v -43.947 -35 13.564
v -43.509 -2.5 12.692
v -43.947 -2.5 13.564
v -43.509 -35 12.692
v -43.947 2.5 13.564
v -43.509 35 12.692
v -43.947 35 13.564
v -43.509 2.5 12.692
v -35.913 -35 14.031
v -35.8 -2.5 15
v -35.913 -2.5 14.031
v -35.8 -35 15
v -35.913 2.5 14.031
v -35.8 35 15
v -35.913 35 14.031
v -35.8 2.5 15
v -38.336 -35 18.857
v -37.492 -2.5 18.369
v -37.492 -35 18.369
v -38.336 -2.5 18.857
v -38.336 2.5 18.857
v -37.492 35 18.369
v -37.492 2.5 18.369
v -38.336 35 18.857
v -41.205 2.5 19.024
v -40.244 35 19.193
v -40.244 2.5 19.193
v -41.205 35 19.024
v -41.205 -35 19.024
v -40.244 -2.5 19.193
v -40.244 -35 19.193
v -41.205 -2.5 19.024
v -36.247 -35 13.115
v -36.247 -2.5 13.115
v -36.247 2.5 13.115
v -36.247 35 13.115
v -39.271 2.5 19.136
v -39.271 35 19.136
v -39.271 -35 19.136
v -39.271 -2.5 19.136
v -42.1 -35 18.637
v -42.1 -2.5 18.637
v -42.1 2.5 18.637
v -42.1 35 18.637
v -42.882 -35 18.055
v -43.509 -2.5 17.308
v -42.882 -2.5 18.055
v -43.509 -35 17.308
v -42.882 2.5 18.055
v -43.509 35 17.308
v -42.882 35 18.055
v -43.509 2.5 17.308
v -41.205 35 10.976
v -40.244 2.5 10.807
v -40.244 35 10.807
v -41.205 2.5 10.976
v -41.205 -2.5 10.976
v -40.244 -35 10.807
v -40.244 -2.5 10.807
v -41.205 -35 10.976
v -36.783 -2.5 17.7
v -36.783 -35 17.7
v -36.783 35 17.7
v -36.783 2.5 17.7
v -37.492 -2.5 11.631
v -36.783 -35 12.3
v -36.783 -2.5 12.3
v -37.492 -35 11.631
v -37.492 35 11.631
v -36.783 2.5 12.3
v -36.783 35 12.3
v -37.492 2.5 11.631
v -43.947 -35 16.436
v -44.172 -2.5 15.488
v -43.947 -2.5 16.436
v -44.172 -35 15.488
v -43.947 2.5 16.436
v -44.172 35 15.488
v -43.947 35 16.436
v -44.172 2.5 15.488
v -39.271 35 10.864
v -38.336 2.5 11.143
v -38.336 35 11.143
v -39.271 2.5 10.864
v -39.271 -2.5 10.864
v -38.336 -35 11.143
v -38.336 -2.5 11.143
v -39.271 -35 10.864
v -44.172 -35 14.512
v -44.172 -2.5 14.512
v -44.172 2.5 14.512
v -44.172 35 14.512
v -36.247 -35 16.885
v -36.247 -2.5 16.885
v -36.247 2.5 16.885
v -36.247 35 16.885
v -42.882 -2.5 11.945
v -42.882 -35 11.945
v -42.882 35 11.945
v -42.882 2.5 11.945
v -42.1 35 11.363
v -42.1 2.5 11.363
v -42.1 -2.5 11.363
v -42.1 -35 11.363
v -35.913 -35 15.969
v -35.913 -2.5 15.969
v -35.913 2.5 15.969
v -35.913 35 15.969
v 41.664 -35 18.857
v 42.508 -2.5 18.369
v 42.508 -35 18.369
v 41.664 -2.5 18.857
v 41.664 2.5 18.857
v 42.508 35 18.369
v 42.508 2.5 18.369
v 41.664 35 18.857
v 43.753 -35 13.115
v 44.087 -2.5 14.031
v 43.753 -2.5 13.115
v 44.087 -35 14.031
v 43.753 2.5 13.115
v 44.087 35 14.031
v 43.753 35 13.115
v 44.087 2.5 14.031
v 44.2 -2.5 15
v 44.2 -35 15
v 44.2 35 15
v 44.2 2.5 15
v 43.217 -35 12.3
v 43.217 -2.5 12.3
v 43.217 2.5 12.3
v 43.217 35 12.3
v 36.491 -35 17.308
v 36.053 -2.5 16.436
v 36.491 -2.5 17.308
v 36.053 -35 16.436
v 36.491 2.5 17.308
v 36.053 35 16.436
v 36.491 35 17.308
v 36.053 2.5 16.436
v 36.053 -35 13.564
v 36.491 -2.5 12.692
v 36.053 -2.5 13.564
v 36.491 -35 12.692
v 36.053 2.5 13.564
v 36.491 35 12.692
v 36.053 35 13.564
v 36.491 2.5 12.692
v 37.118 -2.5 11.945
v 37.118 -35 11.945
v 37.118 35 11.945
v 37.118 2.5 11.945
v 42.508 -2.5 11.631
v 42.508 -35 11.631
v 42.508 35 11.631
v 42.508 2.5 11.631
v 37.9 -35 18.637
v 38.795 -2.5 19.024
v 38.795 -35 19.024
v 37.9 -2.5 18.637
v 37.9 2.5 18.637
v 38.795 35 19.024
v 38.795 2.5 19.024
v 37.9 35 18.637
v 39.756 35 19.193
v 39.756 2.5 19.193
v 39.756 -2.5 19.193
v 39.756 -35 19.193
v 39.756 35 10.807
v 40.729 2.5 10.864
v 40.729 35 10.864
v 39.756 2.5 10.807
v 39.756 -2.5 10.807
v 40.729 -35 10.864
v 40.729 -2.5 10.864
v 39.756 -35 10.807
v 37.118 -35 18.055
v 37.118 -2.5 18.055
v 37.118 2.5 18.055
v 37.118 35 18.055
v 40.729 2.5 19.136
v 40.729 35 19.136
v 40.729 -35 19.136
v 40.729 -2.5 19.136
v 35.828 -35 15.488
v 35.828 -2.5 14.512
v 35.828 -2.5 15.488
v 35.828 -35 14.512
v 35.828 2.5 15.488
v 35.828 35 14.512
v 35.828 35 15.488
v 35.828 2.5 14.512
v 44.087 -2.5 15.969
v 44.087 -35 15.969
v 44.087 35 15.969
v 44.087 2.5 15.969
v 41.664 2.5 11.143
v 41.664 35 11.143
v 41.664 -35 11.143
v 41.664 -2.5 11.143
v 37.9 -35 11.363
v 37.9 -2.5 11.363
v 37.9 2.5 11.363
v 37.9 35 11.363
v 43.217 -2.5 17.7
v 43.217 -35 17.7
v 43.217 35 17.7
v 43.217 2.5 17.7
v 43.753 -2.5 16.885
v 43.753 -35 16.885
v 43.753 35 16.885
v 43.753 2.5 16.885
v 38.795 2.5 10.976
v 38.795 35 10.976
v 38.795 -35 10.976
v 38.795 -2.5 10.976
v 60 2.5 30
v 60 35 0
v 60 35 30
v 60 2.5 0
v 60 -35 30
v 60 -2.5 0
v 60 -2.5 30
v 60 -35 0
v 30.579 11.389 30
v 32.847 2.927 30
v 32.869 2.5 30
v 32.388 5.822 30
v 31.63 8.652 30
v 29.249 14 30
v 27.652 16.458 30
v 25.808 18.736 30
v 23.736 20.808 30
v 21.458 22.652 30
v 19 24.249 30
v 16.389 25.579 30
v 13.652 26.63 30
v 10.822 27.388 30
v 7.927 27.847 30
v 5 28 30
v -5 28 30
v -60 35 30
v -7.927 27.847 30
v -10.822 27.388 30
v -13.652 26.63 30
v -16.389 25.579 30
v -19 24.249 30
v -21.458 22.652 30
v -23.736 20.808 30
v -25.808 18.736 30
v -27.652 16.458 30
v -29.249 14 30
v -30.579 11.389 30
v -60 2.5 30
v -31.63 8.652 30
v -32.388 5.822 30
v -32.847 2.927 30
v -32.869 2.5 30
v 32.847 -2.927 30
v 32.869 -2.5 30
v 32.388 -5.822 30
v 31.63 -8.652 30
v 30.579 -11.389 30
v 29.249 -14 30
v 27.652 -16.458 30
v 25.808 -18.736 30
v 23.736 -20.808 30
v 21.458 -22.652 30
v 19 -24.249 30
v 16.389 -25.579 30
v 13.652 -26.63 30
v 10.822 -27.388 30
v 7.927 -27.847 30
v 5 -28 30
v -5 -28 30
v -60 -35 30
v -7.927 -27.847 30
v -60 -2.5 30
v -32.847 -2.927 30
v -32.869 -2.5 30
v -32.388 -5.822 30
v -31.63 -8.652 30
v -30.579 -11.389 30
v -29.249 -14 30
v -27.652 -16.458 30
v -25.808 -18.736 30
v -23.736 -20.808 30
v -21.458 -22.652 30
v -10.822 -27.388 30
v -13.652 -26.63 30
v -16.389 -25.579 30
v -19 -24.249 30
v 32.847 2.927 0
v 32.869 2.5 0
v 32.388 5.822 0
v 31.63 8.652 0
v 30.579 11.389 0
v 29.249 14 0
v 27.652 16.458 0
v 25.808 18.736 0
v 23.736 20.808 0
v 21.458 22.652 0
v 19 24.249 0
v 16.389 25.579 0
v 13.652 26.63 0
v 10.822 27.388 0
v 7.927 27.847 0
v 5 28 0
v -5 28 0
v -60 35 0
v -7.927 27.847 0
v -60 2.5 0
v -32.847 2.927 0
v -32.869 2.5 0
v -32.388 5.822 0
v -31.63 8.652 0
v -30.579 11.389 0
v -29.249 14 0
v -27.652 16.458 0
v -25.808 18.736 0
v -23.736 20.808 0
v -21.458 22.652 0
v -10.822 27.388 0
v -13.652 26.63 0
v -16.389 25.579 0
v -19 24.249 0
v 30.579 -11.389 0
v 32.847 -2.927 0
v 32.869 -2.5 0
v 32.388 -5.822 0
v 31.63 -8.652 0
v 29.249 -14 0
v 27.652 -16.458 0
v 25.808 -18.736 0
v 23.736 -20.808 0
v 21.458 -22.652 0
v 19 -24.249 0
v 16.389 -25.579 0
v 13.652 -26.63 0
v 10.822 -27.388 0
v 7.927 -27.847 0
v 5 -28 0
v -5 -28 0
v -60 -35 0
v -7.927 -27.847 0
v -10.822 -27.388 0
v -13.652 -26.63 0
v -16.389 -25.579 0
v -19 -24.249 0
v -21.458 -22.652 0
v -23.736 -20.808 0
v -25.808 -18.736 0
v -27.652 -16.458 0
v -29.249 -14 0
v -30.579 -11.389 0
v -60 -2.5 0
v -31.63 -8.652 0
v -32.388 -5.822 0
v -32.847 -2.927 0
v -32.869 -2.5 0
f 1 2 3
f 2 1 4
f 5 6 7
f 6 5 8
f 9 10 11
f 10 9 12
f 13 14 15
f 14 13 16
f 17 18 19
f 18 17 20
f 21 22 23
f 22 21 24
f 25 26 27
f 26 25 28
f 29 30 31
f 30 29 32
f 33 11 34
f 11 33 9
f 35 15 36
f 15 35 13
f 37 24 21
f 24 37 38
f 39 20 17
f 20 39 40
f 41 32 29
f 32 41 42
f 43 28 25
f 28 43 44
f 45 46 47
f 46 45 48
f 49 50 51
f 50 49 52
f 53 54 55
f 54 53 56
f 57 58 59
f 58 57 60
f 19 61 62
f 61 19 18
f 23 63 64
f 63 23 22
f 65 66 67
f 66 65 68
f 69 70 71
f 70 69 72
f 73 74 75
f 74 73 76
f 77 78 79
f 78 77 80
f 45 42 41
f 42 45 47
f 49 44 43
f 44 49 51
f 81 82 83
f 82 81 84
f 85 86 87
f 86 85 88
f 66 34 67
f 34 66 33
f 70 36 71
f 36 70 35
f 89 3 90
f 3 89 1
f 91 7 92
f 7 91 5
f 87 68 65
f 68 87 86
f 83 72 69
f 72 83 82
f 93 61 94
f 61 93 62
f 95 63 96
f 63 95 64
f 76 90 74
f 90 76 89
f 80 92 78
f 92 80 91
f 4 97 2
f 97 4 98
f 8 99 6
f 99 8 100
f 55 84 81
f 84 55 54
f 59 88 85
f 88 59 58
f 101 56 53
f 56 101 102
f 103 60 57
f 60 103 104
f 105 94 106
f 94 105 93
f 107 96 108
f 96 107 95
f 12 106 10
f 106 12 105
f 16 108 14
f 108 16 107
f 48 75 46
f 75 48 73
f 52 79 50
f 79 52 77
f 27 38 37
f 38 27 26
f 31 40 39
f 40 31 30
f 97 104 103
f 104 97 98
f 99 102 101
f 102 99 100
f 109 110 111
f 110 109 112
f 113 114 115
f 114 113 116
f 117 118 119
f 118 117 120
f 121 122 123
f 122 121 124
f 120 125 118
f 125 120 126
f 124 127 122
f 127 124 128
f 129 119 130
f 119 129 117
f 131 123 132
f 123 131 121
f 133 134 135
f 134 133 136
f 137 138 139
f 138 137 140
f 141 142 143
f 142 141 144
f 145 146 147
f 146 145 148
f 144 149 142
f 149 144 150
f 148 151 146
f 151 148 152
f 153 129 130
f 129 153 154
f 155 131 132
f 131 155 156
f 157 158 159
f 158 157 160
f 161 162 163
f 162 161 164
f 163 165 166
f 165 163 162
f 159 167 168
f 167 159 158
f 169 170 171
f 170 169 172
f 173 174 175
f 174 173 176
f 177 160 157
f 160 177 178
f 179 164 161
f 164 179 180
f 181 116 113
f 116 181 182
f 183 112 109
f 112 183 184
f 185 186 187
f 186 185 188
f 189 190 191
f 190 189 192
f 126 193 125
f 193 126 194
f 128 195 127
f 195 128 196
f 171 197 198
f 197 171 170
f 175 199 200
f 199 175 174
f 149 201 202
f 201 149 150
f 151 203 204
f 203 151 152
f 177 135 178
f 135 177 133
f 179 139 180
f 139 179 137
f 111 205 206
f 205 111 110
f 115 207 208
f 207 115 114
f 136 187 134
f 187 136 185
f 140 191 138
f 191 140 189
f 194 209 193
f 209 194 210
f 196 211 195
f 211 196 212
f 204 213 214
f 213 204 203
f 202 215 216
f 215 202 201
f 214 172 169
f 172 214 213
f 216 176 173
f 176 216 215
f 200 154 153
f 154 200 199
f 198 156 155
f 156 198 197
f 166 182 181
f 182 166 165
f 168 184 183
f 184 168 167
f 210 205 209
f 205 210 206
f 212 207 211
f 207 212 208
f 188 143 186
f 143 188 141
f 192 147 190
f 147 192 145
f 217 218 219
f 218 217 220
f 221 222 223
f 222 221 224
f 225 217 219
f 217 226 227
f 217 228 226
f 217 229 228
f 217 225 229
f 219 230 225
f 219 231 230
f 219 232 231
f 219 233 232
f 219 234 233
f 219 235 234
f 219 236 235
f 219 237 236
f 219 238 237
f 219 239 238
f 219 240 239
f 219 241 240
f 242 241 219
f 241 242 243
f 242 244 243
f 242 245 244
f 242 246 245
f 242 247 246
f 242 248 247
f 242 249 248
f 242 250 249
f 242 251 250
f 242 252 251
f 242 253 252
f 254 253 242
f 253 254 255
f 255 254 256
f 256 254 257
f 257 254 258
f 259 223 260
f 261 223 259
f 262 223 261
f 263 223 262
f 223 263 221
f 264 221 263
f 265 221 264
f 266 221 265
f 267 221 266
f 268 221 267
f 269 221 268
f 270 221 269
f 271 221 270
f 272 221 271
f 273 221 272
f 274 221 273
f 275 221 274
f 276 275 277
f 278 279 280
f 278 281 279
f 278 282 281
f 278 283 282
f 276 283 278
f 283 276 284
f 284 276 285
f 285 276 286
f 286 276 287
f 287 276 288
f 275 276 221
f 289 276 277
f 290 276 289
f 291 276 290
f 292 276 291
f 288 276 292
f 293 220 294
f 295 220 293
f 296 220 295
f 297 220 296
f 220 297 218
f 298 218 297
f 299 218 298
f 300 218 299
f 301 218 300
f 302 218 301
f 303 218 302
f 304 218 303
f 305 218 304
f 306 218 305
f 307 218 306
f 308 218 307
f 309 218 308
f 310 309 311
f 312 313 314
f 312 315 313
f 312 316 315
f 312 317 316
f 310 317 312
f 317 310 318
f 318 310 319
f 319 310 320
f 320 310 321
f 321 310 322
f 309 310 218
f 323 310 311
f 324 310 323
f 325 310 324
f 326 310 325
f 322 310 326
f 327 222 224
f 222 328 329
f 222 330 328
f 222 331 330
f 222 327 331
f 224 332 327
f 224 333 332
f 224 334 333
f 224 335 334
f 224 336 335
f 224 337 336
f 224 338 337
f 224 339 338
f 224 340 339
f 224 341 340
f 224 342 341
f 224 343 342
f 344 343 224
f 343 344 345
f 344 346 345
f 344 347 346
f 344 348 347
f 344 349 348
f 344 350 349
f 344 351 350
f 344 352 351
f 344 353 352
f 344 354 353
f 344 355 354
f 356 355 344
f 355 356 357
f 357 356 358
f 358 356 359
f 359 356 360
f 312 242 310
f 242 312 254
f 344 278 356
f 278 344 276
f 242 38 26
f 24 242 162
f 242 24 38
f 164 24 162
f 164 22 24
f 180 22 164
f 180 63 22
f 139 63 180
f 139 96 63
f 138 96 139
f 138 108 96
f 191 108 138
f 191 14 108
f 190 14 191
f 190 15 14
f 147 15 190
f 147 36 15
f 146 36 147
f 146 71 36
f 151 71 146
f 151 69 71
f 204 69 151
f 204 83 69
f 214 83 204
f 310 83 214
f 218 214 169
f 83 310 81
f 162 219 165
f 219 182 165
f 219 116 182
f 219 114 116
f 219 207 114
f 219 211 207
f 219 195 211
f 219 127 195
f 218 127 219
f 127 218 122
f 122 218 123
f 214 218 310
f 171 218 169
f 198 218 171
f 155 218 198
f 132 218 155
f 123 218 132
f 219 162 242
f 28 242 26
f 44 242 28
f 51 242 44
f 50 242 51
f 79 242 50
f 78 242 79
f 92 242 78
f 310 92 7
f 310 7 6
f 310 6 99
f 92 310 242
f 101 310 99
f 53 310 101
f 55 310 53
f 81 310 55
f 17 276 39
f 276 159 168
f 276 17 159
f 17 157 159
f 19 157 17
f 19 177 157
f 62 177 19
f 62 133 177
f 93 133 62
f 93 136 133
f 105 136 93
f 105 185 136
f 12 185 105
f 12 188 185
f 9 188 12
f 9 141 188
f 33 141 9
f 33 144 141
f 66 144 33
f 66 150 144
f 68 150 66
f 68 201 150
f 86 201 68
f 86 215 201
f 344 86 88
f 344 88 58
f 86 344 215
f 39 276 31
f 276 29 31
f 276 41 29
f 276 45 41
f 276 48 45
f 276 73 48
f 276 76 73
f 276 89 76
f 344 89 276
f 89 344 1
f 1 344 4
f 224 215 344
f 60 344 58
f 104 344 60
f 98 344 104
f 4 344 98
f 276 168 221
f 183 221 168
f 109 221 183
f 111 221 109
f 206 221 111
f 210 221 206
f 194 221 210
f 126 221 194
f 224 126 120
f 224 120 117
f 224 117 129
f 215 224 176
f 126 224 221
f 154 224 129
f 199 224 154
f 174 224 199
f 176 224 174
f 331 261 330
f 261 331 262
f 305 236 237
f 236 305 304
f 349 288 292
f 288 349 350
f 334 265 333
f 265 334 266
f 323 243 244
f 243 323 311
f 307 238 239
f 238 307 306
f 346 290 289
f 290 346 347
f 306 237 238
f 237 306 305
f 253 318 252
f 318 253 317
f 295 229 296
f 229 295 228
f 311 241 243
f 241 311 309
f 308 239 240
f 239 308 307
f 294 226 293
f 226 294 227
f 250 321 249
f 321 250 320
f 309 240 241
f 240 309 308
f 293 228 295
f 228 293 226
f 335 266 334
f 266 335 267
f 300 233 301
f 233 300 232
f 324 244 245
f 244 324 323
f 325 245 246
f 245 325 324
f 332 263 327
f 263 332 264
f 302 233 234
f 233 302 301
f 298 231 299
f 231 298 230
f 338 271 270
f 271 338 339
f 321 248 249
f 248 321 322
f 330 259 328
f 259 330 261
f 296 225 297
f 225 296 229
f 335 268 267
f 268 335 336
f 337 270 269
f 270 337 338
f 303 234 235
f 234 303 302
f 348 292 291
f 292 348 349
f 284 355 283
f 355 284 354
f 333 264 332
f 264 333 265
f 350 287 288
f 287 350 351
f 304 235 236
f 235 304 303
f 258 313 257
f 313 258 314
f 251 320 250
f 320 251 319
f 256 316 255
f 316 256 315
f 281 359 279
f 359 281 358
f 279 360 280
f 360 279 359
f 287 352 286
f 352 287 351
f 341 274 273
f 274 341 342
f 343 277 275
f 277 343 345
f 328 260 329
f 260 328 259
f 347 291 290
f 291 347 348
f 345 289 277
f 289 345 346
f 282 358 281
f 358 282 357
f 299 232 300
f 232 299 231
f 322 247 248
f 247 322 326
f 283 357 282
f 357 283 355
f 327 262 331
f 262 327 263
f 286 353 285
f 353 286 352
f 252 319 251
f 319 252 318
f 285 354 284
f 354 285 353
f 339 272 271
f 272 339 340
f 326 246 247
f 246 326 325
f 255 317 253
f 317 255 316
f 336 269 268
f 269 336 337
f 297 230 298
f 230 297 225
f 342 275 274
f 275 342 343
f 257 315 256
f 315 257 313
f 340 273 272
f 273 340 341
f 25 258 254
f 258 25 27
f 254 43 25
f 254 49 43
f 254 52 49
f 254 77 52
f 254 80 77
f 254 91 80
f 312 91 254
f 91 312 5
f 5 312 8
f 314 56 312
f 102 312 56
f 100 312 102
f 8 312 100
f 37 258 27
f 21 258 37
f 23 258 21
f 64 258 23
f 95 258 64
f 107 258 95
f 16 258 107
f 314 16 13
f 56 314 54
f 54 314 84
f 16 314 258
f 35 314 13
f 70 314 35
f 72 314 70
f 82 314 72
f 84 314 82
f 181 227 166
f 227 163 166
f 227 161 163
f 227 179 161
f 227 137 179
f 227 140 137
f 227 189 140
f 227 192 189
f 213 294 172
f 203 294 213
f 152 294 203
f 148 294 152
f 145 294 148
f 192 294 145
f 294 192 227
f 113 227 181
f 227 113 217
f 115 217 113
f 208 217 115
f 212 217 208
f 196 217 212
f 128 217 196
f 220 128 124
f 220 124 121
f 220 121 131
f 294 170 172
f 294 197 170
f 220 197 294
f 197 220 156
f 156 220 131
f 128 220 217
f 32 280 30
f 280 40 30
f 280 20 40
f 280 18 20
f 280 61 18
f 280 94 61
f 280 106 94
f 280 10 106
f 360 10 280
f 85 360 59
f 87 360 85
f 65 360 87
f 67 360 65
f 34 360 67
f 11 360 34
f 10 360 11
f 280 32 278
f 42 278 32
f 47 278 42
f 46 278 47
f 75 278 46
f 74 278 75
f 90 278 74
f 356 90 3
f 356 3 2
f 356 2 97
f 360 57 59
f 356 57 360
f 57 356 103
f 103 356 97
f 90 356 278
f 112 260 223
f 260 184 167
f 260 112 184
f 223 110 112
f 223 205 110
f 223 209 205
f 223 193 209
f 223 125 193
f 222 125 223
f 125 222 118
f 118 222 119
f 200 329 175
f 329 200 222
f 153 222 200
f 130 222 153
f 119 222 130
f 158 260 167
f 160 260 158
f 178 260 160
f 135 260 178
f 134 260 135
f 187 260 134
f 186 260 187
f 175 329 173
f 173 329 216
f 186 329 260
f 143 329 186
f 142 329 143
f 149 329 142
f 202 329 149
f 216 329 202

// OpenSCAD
use <../config.scad>
use <../libs/gears.scad>

$fs=$fs/2;
$fa=$fa/2;

n=3;
d = 150;
d2 =152;


e = 3;



//modul = 2; tooth_number1 = 20; tooth_number2 = 92;
//modul = 2.5; tooth_number1 = 20; tooth_number2 = 72;
modul = 3; tooth_number1 = 24; tooth_number2 = 60; //old 60


pressure_angle = 20;
helix_angle = 0;

//5120
lg_int = 47;
lg_int2 = 13;
h_int = 5;
a = 30;
colonne_d=56;
d_case = 145;

//same
//0 same
//1 5120
//2 mk3
tracteur = 2;




l = lg_int+10;
h2=h_int+5;

r_vis = 4.2;

module m8(l, r){
    cylinder(r=r_vis, l);
}

module couronne1(d_int, ang, h_int){
    lg_int = 25;
    
    l = lg_int+30;
    h2=10;
    
    d2=140;
    d3 = 140;

    difference(){
        
        union(){
            spur_gear (modul=modul, tooth_number=tooth_number2, width=10, bore=d_int, pressure_angle=pressure_angle, helix_angle=-helix_angle, optimized=true);
            
            for(i=[0:n]){
                rotate([0,0,i*360/n])hull(){
                    translate([-l/2,d2/2,0]) cylinder(r=9,h2);
                    translate([ l/2,d2/2,0]) cylinder(r=9,h2);
                }
            }
            
            rotate([0,0,0.5*360])hull(){
                translate([-10,d3/2,0]) cylinder(r=9,h2);
                translate([ 10,d3/2,0]) cylinder(r=9,h2);
            }
            
        }
        
        
        for(i=[0:n]){
            rotate([0,0,i*360/n]) translate([0,d_int/2,h2-h_int]) rotate([ang,0,0]) translate([-lg_int/2,-10,]) cube([lg_int, 100, 20]);
            
        
            for(j=[-1,1]){
                rotate([0,0,i*360/n])translate([j*l/2,d2/2,-1]) m8(200);
            }
            
            rotate([0,0,0.5*360])translate([-25,d3/2,-1])m8(200);;
            rotate([0,0,0.5*360])translate([-10,d3/2,-1])m8(200);;
            rotate([0,0,0.5*360])translate([ 10,d3/2,-1]) m8(200);;
            rotate([0,0,0.5*360])translate([25,d3/2,-1])m8(200);;
            
        }

        translate([0,-200,-1]) cube([0.5,200,100]);
        
        
    }
}

/**
 * IH
 **/

module couronne_ih(){
    difference(){
        
        union(){
            spur_gear (modul=modul, tooth_number=tooth_number2, width=10, bore=d_case, pressure_angle=pressure_angle, helix_angle=helix_angle, optimized=true);
            
            
            for(i=[0:n]){
                rotate([0,0,i*360/n])hull(){
                    translate([-l/2,d2/2,0]) cylinder(r=5,1);
                    translate([ l/2,d2/2,0]) cylinder(r=5,1);
                    translate([-l/2,d2/2,-1]) rotate([a,0,0]) translate([0,0,h2]) cylinder(r=6,1);
                    translate([ l/2,d2/2,-1]) rotate([a,0,0]) translate([0,0,h2]) cylinder(r=6,1);
                }
            }
            
        }
        
        
        for(i=[0:n]){
            for(j= [0,1]){
                rotate([0,0,i*360/n])translate([0,d2/2,-1]) rotate([a,0,0]) mirror([j,0,0])translate([-lg_int/2,-10,h2+1.1-h_int]) cube([lg_int2, 20, h_int]);
            }
            
            rotate([0,0,i*360/n])hull(){
                translate([-l/2,d2/2,-1]) rotate([a,0,0]) translate([0,0,h2+1]) cylinder(r=7,10);
                translate([ l/2,d2/2,-1]) rotate([a,0,0]) translate([0,0,h2+1]) cylinder(r=7,10);
            }
        
            for(j=[-1,1]){
                rotate([0,0,i*360/n])translate([j*l/2,d2/2,-1]) rotate([a,0,0]) m3(200);
                rotate([0,0,i*360/n])translate([j*l/2,d2/2,-1]) rotate([a,0,0]) m3_nut2(8);
            }
        }
        
        for(i=[120,240]){
            rotate([0,0,i])translate([0,d2/2,-1]) rotate([a,0,0]) m3(200);
            rotate([0,0,i])translate([0,d2/2,-1]) rotate([a,0,0]) m3_nut2(8);
        } 
        
        translate([0,0,-1]) cube([0.5,200,100]);
        for(i=[-5,5]){
            translate([i,d2/2,-1]) rotate([a,0,0]) m3(200);
            translate([i,d2/2,-1]) rotate([a,0,0]) m3_nut2(8);
        } 
        
    }
}

e_support = 5;
module support_couronne_ih(){
    difference(){
        union(){
            hull(){
                translate([-l/2,0,0]) cylinder(r=6,e_support);
                translate([ l/2,0,0]) cylinder(r=6,e_support);
            }
        }
        translate([-l/2,0,-1])  m4(200);
        translate([ 0,0,-1])  m4(200);
        translate([ l/2,0,-1])  m4(200);
    }
}

module support_couronne_ih2(){
    difference(){
        union(){
            hull(){
                translate([-l/2,0,0]) cylinder(r=6,e_support);
                translate([ l/2,0,0]) cylinder(r=6,e_support);
            }
        }
        translate([-l/2,0,-1])  m4(200);
        translate([ 5,0,-1])  m4(200);
        translate([ -5,0,-1])  m4(200);
        translate([ l/2,0,-1])  m4(200);
    }
}

x_vis_ih = 80;

module support_colonne_ih(){
    e = 40;
    r  = colonne_d/2+8;
    l = 120;
    lg= 60;
    
    difference(){
        union(){
            cylinder(r=r, e);
            translate([-l/2, -15, 0])cube([l, lg, e]);
        }
        translate([0, 0, -1]) cylinder(r=colonne_d/2, e+2);
        cube([150, 5, 150], center = true);
        
        for(i=[-1,1]){
            translate([i*x_vis_ih/2, -20, e/2]) rotate([-90,0,0]) m8(100, false);
        }
        
    }
    
}

module support_colonne2_ih(){
    
    difference(){
        union(){
            translate([-60,0,0]) cube([120,30,30]);
            for(i=[0,1]){
                mirror([i,0,0])translate([-60,30,0]) cube([30,30,30]);
            }
        }   
        translate([x_vis_ih/2,100,15])  rotate([90,0,0]) m8(200, false);
        translate([-x_vis_ih/2,100,15]) rotate([90,0,0]) m8(200, false);
        
        translate([x_vis_2/2,45,-1])   m8(200, false);
        translate([-x_vis_2/2,45,-1])  m8(200, false);
    }
}


/**
 * SAME
 **/

lg_same_int = 25;
h_same_int = 30;
l_same = lg_same_int+30;
d_same = 120;
same_ang = 25;

module couronne_same(){
    couronne1(d_same, 25, 8);
}

module support_couronne_same(){
    difference(){
        union(){
            translate([-l_same/2-6,-6,0])cube([l_same+12, 12, e_support]);
        }
        translate([-l_same/2,0,-1])  m8(200);
        translate([ l_same/2,0,-1])  m8(200);
    }
}

module support_couronne_same2(){
    difference(){
        union(){
            translate([-l_same/2-6,-8,0])cube([l_same+12, 16, e_support]);
            hull(){
                translate([-lg_same_int/2-6,-8,0])cube([lg_same_int+12, 2, h_same_int+3]);
                translate([-lg_same_int/2-6,6,0])cube([lg_same_int+12, 2, h_same_int+3+16*sin(a)]);
            }
        }
        translate([-l_same/2,0,-1])  m8(200);
        translate([ l_same/2,0,-1])  m8(200);
        translate([0,-12,6]) rotate([a,0,0])cube([lg_same_int, 100, h_same_int+1], center = true);
    }
}

module support_couronne_same3(){
    l_support = 50;
    difference(){
        union(){
            hull(){
                translate([-l_support/2,0,0]) cylinder(r=8,e_support);
                translate([ l_support/2,0,0]) cylinder(r=8,e_support);
            }
        }
        translate([-l_support/2,0,-1])  m8(200);
        translate([-10,0,-1])  m8(200);
        translate([ 10,0,-1])  m8(200);
        translate([ l_support/2,0,-1])  m8(200);
    }
}


x_vis_same = 140;
x_vis_2 = 100;

module support_colonne_same2(){
    e = 20;
    lg_int = 95;
    l_int = 113;
    de=20;
    r  = 20;
    l = 160;
    lg= 70;
    x_vis2 = 140;
    a = -50;//-55
    
    difference(){
        union(){
            translate([-l/2, 5, 0])cube([l, lg, e]);
            
        }
        translate([0, 0, -1]) rotate([0,0,a])cube_arrondi(lg_int, l_int, e+3, r);
            
        for(i=[-1,1]){
            translate([i*x_vis2/2, -100, e/2]) rotate([-90,0,0]) cylinder(200, r=4.5);
        }
        
        cube([l+4, 12, 150], center = true);
    }
}

module support_colonne_same(){
    support_colonne_same2();
    rotate([0,0,180])support_colonne_same2();
}

module support_colonne_same3(){
    rotate([-90,0,0])support_colonne_same2();
}


/**
 * MK3
 **/

lg_mk3_int = 24; //23
h_mk3_int = 26;
l_mk3 = lg_mk3_int+30;
a_mk3 = 10;
module couronne_mk3(){
    couronne1(d_same, a_mk3, 5);
}

module support_couronne_mk3(){
    difference(){
        union(){
            translate([-l_same/2-6,-8,0])cube([l_same+12, 16, e_support]);
            intersection(){
                translate([0,-25,6]) rotate([a_mk3,0,0])cube([lg_mk3_int+12, 100, h_mk3_int+12], center = true);
                translate([-l_same/2-6,-8,0])cube([l_same+12, 16, 70]);
            }
        }
        translate([-l_same/2,0,-1])  m8(200);
        translate([ l_same/2,0,-1])  m8(200);
        translate([0,-25,6]) rotate([a_mk3,0,0])cube([lg_mk3_int, 100, h_mk3_int], center = true);
    }
}

module support_colonne_mk3(){
    e = 30;
    r1  = 56/2;
    r2  = 76/2;
    dr = (r2-r1)/2;
    l = 120;
    lg= 70;
    
    difference(){
        union(){
            translate([-l/2, -lg/2, 0])cube([l, lg, e]);
        }
        hull(){
            translate([-dr, 0, -1])cylinder(r=r1, e+2);
            translate([dr, 0, -1])cylinder(r=r1, e+2);
            
        }
        cube([150, 5, 150], center = true);
        
        for(i=[-1,1]){
            translate([i*x_vis_ih/2, -50, e/2]) rotate([-90,0,0]) m8(100, false);
        }
        
    }
}


    
/**
 * Common
 **/



module couronne(mode2){
    if(tracteur == 0){
        if(mode2 == 0){
            couronne_same();
            for(i=[0:n]){
                rotate([0,0,(i+0.5)*360/n]) translate([0,-d2/2+6,-1]) translate([0,0,h2+1.5])  rotate([0,0,180])support_couronne_same2();
            }
            rotate([0,0,360*3/6]) translate([0,d2/2,-1]) translate([0,0,h2+1.5])  rotate([0,0,180])support_couronne_same3();
        } else if(mode2 == 1){
            couronne_same();
        } else if(mode2 == 2){
            translate([0, 00, 8]) rotate([-90,0,0]) support_couronne_same2();
            translate([0, 45, 8]) rotate([-90,0,0]) support_couronne_same2();
            translate([0, 90, 8]) rotate([-90,0,0]) support_couronne_same2();
            //translate([0, -10, 0]) support_couronne_same3();
            //translate([0, -30, 0]) support_couronne_same3();
        }
    } else if(tracteur == 1){
        if(mode2 == 0){
            couronne_ih();
            for(i=[0:n]){
                rotate([0,0,i*360/n]) translate([0,d2/2,-1]) rotate([a,0,0]) translate([0,0,h2+2])          support_couronne_ih();
            }
        } else if(mode2 == 1){
            couronne_ih();
        } else {
            translate([0,0,0]) support_couronne_ih();
            translate([0,20,0]) support_couronne_ih();
            translate([0,40,0]) support_couronne_ih2();
        }
    } else if(tracteur == 2){
        if(mode2 == 0){
            couronne_mk3();
            for(i=[0:n]){
                rotate([0,0,(i+0.5)*360/n]) translate([0,-d2/2+6,-1]) translate([0,0,h2+1.5])  rotate([0,0,180])support_couronne_mk3();
            }
            rotate([0,0,360*3/6]) translate([0,d2/2,-1]) translate([0,0,h2+1.5])  rotate([0,0,180])support_couronne_mk3();
        } else if(mode2 == 1){
            couronne_mk3();
        } else if(mode2 == 2){
            translate([0, 00, 8]) rotate([-90,0,0]) support_couronne_mk3();
            translate([0, 45, 8]) rotate([-90,0,0]) support_couronne_mk3();
            translate([0, 90, 8]) rotate([-90,0,0]) support_couronne_mk3();
            //translate([0, -10, 0]) support_couronne_same3();
            //translate([0, -30, 0]) support_couronne_same3();
        }
    }
    
}

module support_colonne(mode2){
    if(tracteur == 0){
        support_colonne_same();
    } else if(tracteur == 1){
        support_colonne_ih();
    } else if(tracteur == 2){
        support_colonne_mk3();
    }
    
}

module support_colonne2(mode2){
    if(same){
        support_colonne2_same();
    } else {
        support_colonne2_ih();
    }
    
}



pignon_r = 6/2;
module pignon(){
    difference(){
        union(){
            spur_gear (modul=modul, tooth_number=tooth_number1, width=12, bore=2, pressure_angle=pressure_angle, helix_angle=helix_angle, optimized=true);
            cylinder(r= 18, 30);
            
        }
        cylinder(r=pignon_r, 35, $fn=16);
        
        //translate([7,0,20])rotate([0,-90,0])m3_nut(10);
        //translate([0,0,20])rotate([0,90,0])m3(20);
        
        for(i=[0,1]){
            mirror([i,0,0])translate([-8,0,21])rotate([0,-90,180])support_nut(8, 20, 2);
        }
    }

}

module pignon2(){
    difference(){
        spur_gear (modul=modul, tooth_number=tooth_number1, width=12, bore=2, pressure_angle=pressure_angle, helix_angle=helix_angle, optimized=false);
        translate([0,0,-1])cylinder(r=4.5, 35, $fn=16);
        translate([0,0,5])cylinder(r=58/2, 35);
        
        //translate([7,0,20])rotate([0,-90,0])m3_nut(10);
        //translate([0,0,20])rotate([0,90,0])m3(20);
        
        for(i=[0:6]){
            rotate([0,0,i*60]) translate([24,0,-1])cylinder(r=5/2, 35);;
        }
    }

}





r_moteur = 38/2;
module moteur(){
    translate([0,0,-90])cylinder(r=r_moteur, 90);
    for(i=[0, 60, 120, 180, 240, 300]){
         rotate([0,0,i]) translate([31/2, 0,0]) cylinder(r=3/2, 5);
    }
    
    translate([0, 7,0]) cylinder(r=13/2, 5);
    translate([0, 7,0]) cylinder(r=6/2, 10);
}

r_moteur2 = 46/2;
module moteur2(){
    translate([0,0,0])cylinder(r=r_moteur2, 130);
    //translate([0,0,80])cylinder(r=r_moteur+4, 40);
    for(i=[0, 90, 180, 270]){
         rotate([0,0,i]) translate([37.5/2, 0,-5]) cylinder(r=4.5/2, 10);
    }
    for(i=[0, 90, 180, 270]){
         translate([0, 0, 88]) rotate([90,0,i]) cylinder(r=12, 80 , center=true);
    }
    translate([0, 0,-5]) cylinder(r=27/2, 10);
    translate([0, 0,-10]) cylinder(r=6/2, 20);
    translate([-10, 0, 115]) cube([20, 80, 20]);
}



r_support = 20;

module support_moteur3(x_vis = 80){
    l = x_vis+20;
    
    
    h=50;
    x_moteur = 6;
    
    difference(){
        
        hull(){
            translate([x_moteur,0,0]) cylinder(h,r=45/2);
            translate([-x_vis/2,0,0]) cylinder(h,r=r_support+3);
            translate([x_vis/2,0,0]) cylinder(h,r=12);
            translate([-x_vis/2-r_support/2,0,0]) cylinder(h,r=r_support+3);
        }
        
        
        translate([x_vis/2,0,-1]) m8(h+2);
        hull(){
            translate([-x_vis/2,0,3]) cylinder(h+2,r=r_support);
            translate([-x_vis/2-r_support/2,0,3]) cylinder(h,r=r_support);
        }
        hull(){
            translate([-x_vis/2,0,-1]) cylinder(h+2,r=r_support-2);
            translate([-x_vis/2-r_support/2,0,-1]) cylinder(h+2,r=r_support-2);
        }
            
        
        translate([0,0,-78]) hull(){
                rotate([90,0,0]) translate([-7,0,0])cylinder(r=3, 100);
                rotate([90,0,0]) translate([7,0,0])cylinder(r=3, 100);
            }
        
        translate([x_moteur,0,2]) cylinder(h+2,r=r_moteur);
            
        translate([x_moteur,0,2]) rotate([0,180,0])moteur2();
    }
   
    
    %translate([x_moteur,0,2]) rotate([0,180,0])moteur2();
    
    color("blue")translate([-x_vis/2,0,25]) rotate([0,180,0]) support_moteur3_bis();

}

module support_moteur3_bis(x_vis = 60){
    h1 = 20;
    h2 = h1+20;
    difference(){
        union(){
            cylinder(r = r_support-1,h1);
            cylinder(r = r_support-3,h2);
        }
        translate([r_support-8,0,-1]) m8(100);
        //%translate([0,0,h2-8]) rotate([90,0,0]) translate([0,0,-50])m8(100);
        translate([0,0,h2-8]) rotate([-90,-90,0]) support_nut(8, 100, 100);
        
    }
    
}

module support_moteur4(x_vis =100){
    a = 5;
    l = x_vis+20;
    lg = 10;
    
    
    h=90;
    x_moteur = 0;
    
    difference(){
        
        hull(){
            translate([x_moteur,0,0]) cylinder(h,r=45/2);
            translate([x_vis/2,0,0]) cylinder(h,r=12);
            for(i=[-a,a]){
                translate([x_vis/2-x_vis*cos(i*1),x_vis*sin(i*1),0]) cylinder(h,r=12);
            
            }
            //translate([-x_vis/2,lg,0]) cylinder(h,r=14);
            //translate([-x_vis/2,-lg,0]) cylinder(h,r=14);
            
        }
        
        
        for(i=[-a:a]){
            translate([x_vis/2-x_vis*cos(i*1),x_vis*sin(i*1),-1]) cylinder(h+2,r=4.2);
        
        }
        translate([x_vis/2,0,-1]) cylinder(h+2,r=4.2);
        //translate([-x_vis/2,21,9]) rotate([90,90,0])support_nut(8);
       
        
        translate([-x_vis/2+15,-0,15]) rotate([0,90,0])support_nut(8,30, 10);
        translate([-x_vis/2+15,-0,h-15]) rotate([0,-90,180])support_nut(8,30, 10);
            
        
        translate([0,0,-78]) hull(){
                rotate([90,0,0]) translate([-7,0,0])cylinder(r=3, 100);
                rotate([90,0,0]) translate([7,0,0])cylinder(r=3, 100);
            }
        
        
        translate([x_moteur,0,3]) cylinder(h+2,r=r_moteur);
        hull(){
            translate([x_moteur,0,45]) cube([45,200,2], center = true);
            translate([x_moteur,0,h]) cube([50,200,2], center = true);
        }
        translate([x_moteur,0,2]) rotate([0,180,0])moteur2();
    }
   
    
    %translate([x_moteur,0,3]) rotate([0,180,0])moteur2();
    %translate([x_vis/2-x_vis*cos(a),x_vis*sin(a),0]) cylinder(h,r=4);
    
}

module support_moteur5(x_vis = 100){
    l = x_vis+20;
    lg = 0;
    
    h=130;
    x_moteur = 0;
    
    difference(){
        
        hull(){
            translate([x_moteur,0,0]) cylinder(h,r=52/2);
            translate([x_vis/2,0,0]) cylinder(h,r=12);
            translate([-x_vis/2,0,0]) cylinder(h,r=14);
            translate([-x_vis/2,-lg,0]) cylinder(h,r=14);
            
        }
        
        
        translate([-x_vis/2,0,-1]) cylinder(h+2,r=5);
        translate([x_vis/2,0,-1]) cylinder(h+2,r=5);
        
        
        /*hull(){
            translate([x_moteur,0,45]) cube([45,200,2], center = true);
            translate([x_moteur,0,h]) cube([80,200,2], center = true);
        }¨*/
        translate([x_moteur,0,3]) rotate([0,0,135])moteur2();
        
        translate([35,0,70]) rotate([90,0,0]) cylinder(r=3, 100, center=true);
    }
   
    
    %translate([x_moteur,0,3 ]) rotate([0,0,135])moteur2();
    
    
}

module support_moteur6(x_vis = 100){
    l = x_vis+20;
    y_vis = -14;
    lg = 0;
    
    h=130;
    h2=80;
    x_moteur = 0;
    
    difference(){
        union(){
            hull(){
                cylinder(h2,r=52/2);
                translate([x_vis/2,y_vis,0]) cylinder(h2,r=12);
                translate([-x_vis/2,y_vis,0]) cylinder(h2,r=12);
                
            }
            cylinder(h,r=52/2);
        }
            
        
        
        translate([-x_vis/2,y_vis,-1]) cylinder(h+2,r=5);
        translate([x_vis/2,y_vis,-1]) cylinder(h+2,r=5);
        
        
        /*hull(){
            translate([x_moteur,0,45]) cube([45,200,2], center = true);
            translate([x_moteur,0,h]) cube([80,200,2], center = true);
        }¨*/
        translate([x_moteur,0,3]) rotate([0,0,135])moteur2();
        
        translate([35,0,h2/2]) rotate([90,0,0]) cylinder(r=3, 100, center=true);
    }
   
    
    %translate([x_moteur,0,3 ]) rotate([0,0,135])moteur2();
    
    
}


module support_moteur_same(){
   
   
    support_moteur3(80);
}


mode=5;
if(mode==0){
    couronne(mode);
    
    translate([0,112,5]) rotate([-180,0,8]) pignon();
    
    
    
    translate([0,0,-160]) support_colonne(mode);
    translate([0,60,-160]) support_colonne2();

    translate([0,120,-25])rotate([-180,0,180]) support_moteur6();
    
} else if(mode==1){
   couronne(mode);
} else if(mode==2){
   couronne(2);
} else if(mode==3){
   pignon2();
} else if(mode==4){
   rotate([180,0, 0])support_moteur6();
} else if(mode==5){
    support_colonne();
} else if(mode==6){
   support_moteur_same();
} else if(mode==7){
   support_capteur2();
}


//

//moteur2();

//support_moteur();
